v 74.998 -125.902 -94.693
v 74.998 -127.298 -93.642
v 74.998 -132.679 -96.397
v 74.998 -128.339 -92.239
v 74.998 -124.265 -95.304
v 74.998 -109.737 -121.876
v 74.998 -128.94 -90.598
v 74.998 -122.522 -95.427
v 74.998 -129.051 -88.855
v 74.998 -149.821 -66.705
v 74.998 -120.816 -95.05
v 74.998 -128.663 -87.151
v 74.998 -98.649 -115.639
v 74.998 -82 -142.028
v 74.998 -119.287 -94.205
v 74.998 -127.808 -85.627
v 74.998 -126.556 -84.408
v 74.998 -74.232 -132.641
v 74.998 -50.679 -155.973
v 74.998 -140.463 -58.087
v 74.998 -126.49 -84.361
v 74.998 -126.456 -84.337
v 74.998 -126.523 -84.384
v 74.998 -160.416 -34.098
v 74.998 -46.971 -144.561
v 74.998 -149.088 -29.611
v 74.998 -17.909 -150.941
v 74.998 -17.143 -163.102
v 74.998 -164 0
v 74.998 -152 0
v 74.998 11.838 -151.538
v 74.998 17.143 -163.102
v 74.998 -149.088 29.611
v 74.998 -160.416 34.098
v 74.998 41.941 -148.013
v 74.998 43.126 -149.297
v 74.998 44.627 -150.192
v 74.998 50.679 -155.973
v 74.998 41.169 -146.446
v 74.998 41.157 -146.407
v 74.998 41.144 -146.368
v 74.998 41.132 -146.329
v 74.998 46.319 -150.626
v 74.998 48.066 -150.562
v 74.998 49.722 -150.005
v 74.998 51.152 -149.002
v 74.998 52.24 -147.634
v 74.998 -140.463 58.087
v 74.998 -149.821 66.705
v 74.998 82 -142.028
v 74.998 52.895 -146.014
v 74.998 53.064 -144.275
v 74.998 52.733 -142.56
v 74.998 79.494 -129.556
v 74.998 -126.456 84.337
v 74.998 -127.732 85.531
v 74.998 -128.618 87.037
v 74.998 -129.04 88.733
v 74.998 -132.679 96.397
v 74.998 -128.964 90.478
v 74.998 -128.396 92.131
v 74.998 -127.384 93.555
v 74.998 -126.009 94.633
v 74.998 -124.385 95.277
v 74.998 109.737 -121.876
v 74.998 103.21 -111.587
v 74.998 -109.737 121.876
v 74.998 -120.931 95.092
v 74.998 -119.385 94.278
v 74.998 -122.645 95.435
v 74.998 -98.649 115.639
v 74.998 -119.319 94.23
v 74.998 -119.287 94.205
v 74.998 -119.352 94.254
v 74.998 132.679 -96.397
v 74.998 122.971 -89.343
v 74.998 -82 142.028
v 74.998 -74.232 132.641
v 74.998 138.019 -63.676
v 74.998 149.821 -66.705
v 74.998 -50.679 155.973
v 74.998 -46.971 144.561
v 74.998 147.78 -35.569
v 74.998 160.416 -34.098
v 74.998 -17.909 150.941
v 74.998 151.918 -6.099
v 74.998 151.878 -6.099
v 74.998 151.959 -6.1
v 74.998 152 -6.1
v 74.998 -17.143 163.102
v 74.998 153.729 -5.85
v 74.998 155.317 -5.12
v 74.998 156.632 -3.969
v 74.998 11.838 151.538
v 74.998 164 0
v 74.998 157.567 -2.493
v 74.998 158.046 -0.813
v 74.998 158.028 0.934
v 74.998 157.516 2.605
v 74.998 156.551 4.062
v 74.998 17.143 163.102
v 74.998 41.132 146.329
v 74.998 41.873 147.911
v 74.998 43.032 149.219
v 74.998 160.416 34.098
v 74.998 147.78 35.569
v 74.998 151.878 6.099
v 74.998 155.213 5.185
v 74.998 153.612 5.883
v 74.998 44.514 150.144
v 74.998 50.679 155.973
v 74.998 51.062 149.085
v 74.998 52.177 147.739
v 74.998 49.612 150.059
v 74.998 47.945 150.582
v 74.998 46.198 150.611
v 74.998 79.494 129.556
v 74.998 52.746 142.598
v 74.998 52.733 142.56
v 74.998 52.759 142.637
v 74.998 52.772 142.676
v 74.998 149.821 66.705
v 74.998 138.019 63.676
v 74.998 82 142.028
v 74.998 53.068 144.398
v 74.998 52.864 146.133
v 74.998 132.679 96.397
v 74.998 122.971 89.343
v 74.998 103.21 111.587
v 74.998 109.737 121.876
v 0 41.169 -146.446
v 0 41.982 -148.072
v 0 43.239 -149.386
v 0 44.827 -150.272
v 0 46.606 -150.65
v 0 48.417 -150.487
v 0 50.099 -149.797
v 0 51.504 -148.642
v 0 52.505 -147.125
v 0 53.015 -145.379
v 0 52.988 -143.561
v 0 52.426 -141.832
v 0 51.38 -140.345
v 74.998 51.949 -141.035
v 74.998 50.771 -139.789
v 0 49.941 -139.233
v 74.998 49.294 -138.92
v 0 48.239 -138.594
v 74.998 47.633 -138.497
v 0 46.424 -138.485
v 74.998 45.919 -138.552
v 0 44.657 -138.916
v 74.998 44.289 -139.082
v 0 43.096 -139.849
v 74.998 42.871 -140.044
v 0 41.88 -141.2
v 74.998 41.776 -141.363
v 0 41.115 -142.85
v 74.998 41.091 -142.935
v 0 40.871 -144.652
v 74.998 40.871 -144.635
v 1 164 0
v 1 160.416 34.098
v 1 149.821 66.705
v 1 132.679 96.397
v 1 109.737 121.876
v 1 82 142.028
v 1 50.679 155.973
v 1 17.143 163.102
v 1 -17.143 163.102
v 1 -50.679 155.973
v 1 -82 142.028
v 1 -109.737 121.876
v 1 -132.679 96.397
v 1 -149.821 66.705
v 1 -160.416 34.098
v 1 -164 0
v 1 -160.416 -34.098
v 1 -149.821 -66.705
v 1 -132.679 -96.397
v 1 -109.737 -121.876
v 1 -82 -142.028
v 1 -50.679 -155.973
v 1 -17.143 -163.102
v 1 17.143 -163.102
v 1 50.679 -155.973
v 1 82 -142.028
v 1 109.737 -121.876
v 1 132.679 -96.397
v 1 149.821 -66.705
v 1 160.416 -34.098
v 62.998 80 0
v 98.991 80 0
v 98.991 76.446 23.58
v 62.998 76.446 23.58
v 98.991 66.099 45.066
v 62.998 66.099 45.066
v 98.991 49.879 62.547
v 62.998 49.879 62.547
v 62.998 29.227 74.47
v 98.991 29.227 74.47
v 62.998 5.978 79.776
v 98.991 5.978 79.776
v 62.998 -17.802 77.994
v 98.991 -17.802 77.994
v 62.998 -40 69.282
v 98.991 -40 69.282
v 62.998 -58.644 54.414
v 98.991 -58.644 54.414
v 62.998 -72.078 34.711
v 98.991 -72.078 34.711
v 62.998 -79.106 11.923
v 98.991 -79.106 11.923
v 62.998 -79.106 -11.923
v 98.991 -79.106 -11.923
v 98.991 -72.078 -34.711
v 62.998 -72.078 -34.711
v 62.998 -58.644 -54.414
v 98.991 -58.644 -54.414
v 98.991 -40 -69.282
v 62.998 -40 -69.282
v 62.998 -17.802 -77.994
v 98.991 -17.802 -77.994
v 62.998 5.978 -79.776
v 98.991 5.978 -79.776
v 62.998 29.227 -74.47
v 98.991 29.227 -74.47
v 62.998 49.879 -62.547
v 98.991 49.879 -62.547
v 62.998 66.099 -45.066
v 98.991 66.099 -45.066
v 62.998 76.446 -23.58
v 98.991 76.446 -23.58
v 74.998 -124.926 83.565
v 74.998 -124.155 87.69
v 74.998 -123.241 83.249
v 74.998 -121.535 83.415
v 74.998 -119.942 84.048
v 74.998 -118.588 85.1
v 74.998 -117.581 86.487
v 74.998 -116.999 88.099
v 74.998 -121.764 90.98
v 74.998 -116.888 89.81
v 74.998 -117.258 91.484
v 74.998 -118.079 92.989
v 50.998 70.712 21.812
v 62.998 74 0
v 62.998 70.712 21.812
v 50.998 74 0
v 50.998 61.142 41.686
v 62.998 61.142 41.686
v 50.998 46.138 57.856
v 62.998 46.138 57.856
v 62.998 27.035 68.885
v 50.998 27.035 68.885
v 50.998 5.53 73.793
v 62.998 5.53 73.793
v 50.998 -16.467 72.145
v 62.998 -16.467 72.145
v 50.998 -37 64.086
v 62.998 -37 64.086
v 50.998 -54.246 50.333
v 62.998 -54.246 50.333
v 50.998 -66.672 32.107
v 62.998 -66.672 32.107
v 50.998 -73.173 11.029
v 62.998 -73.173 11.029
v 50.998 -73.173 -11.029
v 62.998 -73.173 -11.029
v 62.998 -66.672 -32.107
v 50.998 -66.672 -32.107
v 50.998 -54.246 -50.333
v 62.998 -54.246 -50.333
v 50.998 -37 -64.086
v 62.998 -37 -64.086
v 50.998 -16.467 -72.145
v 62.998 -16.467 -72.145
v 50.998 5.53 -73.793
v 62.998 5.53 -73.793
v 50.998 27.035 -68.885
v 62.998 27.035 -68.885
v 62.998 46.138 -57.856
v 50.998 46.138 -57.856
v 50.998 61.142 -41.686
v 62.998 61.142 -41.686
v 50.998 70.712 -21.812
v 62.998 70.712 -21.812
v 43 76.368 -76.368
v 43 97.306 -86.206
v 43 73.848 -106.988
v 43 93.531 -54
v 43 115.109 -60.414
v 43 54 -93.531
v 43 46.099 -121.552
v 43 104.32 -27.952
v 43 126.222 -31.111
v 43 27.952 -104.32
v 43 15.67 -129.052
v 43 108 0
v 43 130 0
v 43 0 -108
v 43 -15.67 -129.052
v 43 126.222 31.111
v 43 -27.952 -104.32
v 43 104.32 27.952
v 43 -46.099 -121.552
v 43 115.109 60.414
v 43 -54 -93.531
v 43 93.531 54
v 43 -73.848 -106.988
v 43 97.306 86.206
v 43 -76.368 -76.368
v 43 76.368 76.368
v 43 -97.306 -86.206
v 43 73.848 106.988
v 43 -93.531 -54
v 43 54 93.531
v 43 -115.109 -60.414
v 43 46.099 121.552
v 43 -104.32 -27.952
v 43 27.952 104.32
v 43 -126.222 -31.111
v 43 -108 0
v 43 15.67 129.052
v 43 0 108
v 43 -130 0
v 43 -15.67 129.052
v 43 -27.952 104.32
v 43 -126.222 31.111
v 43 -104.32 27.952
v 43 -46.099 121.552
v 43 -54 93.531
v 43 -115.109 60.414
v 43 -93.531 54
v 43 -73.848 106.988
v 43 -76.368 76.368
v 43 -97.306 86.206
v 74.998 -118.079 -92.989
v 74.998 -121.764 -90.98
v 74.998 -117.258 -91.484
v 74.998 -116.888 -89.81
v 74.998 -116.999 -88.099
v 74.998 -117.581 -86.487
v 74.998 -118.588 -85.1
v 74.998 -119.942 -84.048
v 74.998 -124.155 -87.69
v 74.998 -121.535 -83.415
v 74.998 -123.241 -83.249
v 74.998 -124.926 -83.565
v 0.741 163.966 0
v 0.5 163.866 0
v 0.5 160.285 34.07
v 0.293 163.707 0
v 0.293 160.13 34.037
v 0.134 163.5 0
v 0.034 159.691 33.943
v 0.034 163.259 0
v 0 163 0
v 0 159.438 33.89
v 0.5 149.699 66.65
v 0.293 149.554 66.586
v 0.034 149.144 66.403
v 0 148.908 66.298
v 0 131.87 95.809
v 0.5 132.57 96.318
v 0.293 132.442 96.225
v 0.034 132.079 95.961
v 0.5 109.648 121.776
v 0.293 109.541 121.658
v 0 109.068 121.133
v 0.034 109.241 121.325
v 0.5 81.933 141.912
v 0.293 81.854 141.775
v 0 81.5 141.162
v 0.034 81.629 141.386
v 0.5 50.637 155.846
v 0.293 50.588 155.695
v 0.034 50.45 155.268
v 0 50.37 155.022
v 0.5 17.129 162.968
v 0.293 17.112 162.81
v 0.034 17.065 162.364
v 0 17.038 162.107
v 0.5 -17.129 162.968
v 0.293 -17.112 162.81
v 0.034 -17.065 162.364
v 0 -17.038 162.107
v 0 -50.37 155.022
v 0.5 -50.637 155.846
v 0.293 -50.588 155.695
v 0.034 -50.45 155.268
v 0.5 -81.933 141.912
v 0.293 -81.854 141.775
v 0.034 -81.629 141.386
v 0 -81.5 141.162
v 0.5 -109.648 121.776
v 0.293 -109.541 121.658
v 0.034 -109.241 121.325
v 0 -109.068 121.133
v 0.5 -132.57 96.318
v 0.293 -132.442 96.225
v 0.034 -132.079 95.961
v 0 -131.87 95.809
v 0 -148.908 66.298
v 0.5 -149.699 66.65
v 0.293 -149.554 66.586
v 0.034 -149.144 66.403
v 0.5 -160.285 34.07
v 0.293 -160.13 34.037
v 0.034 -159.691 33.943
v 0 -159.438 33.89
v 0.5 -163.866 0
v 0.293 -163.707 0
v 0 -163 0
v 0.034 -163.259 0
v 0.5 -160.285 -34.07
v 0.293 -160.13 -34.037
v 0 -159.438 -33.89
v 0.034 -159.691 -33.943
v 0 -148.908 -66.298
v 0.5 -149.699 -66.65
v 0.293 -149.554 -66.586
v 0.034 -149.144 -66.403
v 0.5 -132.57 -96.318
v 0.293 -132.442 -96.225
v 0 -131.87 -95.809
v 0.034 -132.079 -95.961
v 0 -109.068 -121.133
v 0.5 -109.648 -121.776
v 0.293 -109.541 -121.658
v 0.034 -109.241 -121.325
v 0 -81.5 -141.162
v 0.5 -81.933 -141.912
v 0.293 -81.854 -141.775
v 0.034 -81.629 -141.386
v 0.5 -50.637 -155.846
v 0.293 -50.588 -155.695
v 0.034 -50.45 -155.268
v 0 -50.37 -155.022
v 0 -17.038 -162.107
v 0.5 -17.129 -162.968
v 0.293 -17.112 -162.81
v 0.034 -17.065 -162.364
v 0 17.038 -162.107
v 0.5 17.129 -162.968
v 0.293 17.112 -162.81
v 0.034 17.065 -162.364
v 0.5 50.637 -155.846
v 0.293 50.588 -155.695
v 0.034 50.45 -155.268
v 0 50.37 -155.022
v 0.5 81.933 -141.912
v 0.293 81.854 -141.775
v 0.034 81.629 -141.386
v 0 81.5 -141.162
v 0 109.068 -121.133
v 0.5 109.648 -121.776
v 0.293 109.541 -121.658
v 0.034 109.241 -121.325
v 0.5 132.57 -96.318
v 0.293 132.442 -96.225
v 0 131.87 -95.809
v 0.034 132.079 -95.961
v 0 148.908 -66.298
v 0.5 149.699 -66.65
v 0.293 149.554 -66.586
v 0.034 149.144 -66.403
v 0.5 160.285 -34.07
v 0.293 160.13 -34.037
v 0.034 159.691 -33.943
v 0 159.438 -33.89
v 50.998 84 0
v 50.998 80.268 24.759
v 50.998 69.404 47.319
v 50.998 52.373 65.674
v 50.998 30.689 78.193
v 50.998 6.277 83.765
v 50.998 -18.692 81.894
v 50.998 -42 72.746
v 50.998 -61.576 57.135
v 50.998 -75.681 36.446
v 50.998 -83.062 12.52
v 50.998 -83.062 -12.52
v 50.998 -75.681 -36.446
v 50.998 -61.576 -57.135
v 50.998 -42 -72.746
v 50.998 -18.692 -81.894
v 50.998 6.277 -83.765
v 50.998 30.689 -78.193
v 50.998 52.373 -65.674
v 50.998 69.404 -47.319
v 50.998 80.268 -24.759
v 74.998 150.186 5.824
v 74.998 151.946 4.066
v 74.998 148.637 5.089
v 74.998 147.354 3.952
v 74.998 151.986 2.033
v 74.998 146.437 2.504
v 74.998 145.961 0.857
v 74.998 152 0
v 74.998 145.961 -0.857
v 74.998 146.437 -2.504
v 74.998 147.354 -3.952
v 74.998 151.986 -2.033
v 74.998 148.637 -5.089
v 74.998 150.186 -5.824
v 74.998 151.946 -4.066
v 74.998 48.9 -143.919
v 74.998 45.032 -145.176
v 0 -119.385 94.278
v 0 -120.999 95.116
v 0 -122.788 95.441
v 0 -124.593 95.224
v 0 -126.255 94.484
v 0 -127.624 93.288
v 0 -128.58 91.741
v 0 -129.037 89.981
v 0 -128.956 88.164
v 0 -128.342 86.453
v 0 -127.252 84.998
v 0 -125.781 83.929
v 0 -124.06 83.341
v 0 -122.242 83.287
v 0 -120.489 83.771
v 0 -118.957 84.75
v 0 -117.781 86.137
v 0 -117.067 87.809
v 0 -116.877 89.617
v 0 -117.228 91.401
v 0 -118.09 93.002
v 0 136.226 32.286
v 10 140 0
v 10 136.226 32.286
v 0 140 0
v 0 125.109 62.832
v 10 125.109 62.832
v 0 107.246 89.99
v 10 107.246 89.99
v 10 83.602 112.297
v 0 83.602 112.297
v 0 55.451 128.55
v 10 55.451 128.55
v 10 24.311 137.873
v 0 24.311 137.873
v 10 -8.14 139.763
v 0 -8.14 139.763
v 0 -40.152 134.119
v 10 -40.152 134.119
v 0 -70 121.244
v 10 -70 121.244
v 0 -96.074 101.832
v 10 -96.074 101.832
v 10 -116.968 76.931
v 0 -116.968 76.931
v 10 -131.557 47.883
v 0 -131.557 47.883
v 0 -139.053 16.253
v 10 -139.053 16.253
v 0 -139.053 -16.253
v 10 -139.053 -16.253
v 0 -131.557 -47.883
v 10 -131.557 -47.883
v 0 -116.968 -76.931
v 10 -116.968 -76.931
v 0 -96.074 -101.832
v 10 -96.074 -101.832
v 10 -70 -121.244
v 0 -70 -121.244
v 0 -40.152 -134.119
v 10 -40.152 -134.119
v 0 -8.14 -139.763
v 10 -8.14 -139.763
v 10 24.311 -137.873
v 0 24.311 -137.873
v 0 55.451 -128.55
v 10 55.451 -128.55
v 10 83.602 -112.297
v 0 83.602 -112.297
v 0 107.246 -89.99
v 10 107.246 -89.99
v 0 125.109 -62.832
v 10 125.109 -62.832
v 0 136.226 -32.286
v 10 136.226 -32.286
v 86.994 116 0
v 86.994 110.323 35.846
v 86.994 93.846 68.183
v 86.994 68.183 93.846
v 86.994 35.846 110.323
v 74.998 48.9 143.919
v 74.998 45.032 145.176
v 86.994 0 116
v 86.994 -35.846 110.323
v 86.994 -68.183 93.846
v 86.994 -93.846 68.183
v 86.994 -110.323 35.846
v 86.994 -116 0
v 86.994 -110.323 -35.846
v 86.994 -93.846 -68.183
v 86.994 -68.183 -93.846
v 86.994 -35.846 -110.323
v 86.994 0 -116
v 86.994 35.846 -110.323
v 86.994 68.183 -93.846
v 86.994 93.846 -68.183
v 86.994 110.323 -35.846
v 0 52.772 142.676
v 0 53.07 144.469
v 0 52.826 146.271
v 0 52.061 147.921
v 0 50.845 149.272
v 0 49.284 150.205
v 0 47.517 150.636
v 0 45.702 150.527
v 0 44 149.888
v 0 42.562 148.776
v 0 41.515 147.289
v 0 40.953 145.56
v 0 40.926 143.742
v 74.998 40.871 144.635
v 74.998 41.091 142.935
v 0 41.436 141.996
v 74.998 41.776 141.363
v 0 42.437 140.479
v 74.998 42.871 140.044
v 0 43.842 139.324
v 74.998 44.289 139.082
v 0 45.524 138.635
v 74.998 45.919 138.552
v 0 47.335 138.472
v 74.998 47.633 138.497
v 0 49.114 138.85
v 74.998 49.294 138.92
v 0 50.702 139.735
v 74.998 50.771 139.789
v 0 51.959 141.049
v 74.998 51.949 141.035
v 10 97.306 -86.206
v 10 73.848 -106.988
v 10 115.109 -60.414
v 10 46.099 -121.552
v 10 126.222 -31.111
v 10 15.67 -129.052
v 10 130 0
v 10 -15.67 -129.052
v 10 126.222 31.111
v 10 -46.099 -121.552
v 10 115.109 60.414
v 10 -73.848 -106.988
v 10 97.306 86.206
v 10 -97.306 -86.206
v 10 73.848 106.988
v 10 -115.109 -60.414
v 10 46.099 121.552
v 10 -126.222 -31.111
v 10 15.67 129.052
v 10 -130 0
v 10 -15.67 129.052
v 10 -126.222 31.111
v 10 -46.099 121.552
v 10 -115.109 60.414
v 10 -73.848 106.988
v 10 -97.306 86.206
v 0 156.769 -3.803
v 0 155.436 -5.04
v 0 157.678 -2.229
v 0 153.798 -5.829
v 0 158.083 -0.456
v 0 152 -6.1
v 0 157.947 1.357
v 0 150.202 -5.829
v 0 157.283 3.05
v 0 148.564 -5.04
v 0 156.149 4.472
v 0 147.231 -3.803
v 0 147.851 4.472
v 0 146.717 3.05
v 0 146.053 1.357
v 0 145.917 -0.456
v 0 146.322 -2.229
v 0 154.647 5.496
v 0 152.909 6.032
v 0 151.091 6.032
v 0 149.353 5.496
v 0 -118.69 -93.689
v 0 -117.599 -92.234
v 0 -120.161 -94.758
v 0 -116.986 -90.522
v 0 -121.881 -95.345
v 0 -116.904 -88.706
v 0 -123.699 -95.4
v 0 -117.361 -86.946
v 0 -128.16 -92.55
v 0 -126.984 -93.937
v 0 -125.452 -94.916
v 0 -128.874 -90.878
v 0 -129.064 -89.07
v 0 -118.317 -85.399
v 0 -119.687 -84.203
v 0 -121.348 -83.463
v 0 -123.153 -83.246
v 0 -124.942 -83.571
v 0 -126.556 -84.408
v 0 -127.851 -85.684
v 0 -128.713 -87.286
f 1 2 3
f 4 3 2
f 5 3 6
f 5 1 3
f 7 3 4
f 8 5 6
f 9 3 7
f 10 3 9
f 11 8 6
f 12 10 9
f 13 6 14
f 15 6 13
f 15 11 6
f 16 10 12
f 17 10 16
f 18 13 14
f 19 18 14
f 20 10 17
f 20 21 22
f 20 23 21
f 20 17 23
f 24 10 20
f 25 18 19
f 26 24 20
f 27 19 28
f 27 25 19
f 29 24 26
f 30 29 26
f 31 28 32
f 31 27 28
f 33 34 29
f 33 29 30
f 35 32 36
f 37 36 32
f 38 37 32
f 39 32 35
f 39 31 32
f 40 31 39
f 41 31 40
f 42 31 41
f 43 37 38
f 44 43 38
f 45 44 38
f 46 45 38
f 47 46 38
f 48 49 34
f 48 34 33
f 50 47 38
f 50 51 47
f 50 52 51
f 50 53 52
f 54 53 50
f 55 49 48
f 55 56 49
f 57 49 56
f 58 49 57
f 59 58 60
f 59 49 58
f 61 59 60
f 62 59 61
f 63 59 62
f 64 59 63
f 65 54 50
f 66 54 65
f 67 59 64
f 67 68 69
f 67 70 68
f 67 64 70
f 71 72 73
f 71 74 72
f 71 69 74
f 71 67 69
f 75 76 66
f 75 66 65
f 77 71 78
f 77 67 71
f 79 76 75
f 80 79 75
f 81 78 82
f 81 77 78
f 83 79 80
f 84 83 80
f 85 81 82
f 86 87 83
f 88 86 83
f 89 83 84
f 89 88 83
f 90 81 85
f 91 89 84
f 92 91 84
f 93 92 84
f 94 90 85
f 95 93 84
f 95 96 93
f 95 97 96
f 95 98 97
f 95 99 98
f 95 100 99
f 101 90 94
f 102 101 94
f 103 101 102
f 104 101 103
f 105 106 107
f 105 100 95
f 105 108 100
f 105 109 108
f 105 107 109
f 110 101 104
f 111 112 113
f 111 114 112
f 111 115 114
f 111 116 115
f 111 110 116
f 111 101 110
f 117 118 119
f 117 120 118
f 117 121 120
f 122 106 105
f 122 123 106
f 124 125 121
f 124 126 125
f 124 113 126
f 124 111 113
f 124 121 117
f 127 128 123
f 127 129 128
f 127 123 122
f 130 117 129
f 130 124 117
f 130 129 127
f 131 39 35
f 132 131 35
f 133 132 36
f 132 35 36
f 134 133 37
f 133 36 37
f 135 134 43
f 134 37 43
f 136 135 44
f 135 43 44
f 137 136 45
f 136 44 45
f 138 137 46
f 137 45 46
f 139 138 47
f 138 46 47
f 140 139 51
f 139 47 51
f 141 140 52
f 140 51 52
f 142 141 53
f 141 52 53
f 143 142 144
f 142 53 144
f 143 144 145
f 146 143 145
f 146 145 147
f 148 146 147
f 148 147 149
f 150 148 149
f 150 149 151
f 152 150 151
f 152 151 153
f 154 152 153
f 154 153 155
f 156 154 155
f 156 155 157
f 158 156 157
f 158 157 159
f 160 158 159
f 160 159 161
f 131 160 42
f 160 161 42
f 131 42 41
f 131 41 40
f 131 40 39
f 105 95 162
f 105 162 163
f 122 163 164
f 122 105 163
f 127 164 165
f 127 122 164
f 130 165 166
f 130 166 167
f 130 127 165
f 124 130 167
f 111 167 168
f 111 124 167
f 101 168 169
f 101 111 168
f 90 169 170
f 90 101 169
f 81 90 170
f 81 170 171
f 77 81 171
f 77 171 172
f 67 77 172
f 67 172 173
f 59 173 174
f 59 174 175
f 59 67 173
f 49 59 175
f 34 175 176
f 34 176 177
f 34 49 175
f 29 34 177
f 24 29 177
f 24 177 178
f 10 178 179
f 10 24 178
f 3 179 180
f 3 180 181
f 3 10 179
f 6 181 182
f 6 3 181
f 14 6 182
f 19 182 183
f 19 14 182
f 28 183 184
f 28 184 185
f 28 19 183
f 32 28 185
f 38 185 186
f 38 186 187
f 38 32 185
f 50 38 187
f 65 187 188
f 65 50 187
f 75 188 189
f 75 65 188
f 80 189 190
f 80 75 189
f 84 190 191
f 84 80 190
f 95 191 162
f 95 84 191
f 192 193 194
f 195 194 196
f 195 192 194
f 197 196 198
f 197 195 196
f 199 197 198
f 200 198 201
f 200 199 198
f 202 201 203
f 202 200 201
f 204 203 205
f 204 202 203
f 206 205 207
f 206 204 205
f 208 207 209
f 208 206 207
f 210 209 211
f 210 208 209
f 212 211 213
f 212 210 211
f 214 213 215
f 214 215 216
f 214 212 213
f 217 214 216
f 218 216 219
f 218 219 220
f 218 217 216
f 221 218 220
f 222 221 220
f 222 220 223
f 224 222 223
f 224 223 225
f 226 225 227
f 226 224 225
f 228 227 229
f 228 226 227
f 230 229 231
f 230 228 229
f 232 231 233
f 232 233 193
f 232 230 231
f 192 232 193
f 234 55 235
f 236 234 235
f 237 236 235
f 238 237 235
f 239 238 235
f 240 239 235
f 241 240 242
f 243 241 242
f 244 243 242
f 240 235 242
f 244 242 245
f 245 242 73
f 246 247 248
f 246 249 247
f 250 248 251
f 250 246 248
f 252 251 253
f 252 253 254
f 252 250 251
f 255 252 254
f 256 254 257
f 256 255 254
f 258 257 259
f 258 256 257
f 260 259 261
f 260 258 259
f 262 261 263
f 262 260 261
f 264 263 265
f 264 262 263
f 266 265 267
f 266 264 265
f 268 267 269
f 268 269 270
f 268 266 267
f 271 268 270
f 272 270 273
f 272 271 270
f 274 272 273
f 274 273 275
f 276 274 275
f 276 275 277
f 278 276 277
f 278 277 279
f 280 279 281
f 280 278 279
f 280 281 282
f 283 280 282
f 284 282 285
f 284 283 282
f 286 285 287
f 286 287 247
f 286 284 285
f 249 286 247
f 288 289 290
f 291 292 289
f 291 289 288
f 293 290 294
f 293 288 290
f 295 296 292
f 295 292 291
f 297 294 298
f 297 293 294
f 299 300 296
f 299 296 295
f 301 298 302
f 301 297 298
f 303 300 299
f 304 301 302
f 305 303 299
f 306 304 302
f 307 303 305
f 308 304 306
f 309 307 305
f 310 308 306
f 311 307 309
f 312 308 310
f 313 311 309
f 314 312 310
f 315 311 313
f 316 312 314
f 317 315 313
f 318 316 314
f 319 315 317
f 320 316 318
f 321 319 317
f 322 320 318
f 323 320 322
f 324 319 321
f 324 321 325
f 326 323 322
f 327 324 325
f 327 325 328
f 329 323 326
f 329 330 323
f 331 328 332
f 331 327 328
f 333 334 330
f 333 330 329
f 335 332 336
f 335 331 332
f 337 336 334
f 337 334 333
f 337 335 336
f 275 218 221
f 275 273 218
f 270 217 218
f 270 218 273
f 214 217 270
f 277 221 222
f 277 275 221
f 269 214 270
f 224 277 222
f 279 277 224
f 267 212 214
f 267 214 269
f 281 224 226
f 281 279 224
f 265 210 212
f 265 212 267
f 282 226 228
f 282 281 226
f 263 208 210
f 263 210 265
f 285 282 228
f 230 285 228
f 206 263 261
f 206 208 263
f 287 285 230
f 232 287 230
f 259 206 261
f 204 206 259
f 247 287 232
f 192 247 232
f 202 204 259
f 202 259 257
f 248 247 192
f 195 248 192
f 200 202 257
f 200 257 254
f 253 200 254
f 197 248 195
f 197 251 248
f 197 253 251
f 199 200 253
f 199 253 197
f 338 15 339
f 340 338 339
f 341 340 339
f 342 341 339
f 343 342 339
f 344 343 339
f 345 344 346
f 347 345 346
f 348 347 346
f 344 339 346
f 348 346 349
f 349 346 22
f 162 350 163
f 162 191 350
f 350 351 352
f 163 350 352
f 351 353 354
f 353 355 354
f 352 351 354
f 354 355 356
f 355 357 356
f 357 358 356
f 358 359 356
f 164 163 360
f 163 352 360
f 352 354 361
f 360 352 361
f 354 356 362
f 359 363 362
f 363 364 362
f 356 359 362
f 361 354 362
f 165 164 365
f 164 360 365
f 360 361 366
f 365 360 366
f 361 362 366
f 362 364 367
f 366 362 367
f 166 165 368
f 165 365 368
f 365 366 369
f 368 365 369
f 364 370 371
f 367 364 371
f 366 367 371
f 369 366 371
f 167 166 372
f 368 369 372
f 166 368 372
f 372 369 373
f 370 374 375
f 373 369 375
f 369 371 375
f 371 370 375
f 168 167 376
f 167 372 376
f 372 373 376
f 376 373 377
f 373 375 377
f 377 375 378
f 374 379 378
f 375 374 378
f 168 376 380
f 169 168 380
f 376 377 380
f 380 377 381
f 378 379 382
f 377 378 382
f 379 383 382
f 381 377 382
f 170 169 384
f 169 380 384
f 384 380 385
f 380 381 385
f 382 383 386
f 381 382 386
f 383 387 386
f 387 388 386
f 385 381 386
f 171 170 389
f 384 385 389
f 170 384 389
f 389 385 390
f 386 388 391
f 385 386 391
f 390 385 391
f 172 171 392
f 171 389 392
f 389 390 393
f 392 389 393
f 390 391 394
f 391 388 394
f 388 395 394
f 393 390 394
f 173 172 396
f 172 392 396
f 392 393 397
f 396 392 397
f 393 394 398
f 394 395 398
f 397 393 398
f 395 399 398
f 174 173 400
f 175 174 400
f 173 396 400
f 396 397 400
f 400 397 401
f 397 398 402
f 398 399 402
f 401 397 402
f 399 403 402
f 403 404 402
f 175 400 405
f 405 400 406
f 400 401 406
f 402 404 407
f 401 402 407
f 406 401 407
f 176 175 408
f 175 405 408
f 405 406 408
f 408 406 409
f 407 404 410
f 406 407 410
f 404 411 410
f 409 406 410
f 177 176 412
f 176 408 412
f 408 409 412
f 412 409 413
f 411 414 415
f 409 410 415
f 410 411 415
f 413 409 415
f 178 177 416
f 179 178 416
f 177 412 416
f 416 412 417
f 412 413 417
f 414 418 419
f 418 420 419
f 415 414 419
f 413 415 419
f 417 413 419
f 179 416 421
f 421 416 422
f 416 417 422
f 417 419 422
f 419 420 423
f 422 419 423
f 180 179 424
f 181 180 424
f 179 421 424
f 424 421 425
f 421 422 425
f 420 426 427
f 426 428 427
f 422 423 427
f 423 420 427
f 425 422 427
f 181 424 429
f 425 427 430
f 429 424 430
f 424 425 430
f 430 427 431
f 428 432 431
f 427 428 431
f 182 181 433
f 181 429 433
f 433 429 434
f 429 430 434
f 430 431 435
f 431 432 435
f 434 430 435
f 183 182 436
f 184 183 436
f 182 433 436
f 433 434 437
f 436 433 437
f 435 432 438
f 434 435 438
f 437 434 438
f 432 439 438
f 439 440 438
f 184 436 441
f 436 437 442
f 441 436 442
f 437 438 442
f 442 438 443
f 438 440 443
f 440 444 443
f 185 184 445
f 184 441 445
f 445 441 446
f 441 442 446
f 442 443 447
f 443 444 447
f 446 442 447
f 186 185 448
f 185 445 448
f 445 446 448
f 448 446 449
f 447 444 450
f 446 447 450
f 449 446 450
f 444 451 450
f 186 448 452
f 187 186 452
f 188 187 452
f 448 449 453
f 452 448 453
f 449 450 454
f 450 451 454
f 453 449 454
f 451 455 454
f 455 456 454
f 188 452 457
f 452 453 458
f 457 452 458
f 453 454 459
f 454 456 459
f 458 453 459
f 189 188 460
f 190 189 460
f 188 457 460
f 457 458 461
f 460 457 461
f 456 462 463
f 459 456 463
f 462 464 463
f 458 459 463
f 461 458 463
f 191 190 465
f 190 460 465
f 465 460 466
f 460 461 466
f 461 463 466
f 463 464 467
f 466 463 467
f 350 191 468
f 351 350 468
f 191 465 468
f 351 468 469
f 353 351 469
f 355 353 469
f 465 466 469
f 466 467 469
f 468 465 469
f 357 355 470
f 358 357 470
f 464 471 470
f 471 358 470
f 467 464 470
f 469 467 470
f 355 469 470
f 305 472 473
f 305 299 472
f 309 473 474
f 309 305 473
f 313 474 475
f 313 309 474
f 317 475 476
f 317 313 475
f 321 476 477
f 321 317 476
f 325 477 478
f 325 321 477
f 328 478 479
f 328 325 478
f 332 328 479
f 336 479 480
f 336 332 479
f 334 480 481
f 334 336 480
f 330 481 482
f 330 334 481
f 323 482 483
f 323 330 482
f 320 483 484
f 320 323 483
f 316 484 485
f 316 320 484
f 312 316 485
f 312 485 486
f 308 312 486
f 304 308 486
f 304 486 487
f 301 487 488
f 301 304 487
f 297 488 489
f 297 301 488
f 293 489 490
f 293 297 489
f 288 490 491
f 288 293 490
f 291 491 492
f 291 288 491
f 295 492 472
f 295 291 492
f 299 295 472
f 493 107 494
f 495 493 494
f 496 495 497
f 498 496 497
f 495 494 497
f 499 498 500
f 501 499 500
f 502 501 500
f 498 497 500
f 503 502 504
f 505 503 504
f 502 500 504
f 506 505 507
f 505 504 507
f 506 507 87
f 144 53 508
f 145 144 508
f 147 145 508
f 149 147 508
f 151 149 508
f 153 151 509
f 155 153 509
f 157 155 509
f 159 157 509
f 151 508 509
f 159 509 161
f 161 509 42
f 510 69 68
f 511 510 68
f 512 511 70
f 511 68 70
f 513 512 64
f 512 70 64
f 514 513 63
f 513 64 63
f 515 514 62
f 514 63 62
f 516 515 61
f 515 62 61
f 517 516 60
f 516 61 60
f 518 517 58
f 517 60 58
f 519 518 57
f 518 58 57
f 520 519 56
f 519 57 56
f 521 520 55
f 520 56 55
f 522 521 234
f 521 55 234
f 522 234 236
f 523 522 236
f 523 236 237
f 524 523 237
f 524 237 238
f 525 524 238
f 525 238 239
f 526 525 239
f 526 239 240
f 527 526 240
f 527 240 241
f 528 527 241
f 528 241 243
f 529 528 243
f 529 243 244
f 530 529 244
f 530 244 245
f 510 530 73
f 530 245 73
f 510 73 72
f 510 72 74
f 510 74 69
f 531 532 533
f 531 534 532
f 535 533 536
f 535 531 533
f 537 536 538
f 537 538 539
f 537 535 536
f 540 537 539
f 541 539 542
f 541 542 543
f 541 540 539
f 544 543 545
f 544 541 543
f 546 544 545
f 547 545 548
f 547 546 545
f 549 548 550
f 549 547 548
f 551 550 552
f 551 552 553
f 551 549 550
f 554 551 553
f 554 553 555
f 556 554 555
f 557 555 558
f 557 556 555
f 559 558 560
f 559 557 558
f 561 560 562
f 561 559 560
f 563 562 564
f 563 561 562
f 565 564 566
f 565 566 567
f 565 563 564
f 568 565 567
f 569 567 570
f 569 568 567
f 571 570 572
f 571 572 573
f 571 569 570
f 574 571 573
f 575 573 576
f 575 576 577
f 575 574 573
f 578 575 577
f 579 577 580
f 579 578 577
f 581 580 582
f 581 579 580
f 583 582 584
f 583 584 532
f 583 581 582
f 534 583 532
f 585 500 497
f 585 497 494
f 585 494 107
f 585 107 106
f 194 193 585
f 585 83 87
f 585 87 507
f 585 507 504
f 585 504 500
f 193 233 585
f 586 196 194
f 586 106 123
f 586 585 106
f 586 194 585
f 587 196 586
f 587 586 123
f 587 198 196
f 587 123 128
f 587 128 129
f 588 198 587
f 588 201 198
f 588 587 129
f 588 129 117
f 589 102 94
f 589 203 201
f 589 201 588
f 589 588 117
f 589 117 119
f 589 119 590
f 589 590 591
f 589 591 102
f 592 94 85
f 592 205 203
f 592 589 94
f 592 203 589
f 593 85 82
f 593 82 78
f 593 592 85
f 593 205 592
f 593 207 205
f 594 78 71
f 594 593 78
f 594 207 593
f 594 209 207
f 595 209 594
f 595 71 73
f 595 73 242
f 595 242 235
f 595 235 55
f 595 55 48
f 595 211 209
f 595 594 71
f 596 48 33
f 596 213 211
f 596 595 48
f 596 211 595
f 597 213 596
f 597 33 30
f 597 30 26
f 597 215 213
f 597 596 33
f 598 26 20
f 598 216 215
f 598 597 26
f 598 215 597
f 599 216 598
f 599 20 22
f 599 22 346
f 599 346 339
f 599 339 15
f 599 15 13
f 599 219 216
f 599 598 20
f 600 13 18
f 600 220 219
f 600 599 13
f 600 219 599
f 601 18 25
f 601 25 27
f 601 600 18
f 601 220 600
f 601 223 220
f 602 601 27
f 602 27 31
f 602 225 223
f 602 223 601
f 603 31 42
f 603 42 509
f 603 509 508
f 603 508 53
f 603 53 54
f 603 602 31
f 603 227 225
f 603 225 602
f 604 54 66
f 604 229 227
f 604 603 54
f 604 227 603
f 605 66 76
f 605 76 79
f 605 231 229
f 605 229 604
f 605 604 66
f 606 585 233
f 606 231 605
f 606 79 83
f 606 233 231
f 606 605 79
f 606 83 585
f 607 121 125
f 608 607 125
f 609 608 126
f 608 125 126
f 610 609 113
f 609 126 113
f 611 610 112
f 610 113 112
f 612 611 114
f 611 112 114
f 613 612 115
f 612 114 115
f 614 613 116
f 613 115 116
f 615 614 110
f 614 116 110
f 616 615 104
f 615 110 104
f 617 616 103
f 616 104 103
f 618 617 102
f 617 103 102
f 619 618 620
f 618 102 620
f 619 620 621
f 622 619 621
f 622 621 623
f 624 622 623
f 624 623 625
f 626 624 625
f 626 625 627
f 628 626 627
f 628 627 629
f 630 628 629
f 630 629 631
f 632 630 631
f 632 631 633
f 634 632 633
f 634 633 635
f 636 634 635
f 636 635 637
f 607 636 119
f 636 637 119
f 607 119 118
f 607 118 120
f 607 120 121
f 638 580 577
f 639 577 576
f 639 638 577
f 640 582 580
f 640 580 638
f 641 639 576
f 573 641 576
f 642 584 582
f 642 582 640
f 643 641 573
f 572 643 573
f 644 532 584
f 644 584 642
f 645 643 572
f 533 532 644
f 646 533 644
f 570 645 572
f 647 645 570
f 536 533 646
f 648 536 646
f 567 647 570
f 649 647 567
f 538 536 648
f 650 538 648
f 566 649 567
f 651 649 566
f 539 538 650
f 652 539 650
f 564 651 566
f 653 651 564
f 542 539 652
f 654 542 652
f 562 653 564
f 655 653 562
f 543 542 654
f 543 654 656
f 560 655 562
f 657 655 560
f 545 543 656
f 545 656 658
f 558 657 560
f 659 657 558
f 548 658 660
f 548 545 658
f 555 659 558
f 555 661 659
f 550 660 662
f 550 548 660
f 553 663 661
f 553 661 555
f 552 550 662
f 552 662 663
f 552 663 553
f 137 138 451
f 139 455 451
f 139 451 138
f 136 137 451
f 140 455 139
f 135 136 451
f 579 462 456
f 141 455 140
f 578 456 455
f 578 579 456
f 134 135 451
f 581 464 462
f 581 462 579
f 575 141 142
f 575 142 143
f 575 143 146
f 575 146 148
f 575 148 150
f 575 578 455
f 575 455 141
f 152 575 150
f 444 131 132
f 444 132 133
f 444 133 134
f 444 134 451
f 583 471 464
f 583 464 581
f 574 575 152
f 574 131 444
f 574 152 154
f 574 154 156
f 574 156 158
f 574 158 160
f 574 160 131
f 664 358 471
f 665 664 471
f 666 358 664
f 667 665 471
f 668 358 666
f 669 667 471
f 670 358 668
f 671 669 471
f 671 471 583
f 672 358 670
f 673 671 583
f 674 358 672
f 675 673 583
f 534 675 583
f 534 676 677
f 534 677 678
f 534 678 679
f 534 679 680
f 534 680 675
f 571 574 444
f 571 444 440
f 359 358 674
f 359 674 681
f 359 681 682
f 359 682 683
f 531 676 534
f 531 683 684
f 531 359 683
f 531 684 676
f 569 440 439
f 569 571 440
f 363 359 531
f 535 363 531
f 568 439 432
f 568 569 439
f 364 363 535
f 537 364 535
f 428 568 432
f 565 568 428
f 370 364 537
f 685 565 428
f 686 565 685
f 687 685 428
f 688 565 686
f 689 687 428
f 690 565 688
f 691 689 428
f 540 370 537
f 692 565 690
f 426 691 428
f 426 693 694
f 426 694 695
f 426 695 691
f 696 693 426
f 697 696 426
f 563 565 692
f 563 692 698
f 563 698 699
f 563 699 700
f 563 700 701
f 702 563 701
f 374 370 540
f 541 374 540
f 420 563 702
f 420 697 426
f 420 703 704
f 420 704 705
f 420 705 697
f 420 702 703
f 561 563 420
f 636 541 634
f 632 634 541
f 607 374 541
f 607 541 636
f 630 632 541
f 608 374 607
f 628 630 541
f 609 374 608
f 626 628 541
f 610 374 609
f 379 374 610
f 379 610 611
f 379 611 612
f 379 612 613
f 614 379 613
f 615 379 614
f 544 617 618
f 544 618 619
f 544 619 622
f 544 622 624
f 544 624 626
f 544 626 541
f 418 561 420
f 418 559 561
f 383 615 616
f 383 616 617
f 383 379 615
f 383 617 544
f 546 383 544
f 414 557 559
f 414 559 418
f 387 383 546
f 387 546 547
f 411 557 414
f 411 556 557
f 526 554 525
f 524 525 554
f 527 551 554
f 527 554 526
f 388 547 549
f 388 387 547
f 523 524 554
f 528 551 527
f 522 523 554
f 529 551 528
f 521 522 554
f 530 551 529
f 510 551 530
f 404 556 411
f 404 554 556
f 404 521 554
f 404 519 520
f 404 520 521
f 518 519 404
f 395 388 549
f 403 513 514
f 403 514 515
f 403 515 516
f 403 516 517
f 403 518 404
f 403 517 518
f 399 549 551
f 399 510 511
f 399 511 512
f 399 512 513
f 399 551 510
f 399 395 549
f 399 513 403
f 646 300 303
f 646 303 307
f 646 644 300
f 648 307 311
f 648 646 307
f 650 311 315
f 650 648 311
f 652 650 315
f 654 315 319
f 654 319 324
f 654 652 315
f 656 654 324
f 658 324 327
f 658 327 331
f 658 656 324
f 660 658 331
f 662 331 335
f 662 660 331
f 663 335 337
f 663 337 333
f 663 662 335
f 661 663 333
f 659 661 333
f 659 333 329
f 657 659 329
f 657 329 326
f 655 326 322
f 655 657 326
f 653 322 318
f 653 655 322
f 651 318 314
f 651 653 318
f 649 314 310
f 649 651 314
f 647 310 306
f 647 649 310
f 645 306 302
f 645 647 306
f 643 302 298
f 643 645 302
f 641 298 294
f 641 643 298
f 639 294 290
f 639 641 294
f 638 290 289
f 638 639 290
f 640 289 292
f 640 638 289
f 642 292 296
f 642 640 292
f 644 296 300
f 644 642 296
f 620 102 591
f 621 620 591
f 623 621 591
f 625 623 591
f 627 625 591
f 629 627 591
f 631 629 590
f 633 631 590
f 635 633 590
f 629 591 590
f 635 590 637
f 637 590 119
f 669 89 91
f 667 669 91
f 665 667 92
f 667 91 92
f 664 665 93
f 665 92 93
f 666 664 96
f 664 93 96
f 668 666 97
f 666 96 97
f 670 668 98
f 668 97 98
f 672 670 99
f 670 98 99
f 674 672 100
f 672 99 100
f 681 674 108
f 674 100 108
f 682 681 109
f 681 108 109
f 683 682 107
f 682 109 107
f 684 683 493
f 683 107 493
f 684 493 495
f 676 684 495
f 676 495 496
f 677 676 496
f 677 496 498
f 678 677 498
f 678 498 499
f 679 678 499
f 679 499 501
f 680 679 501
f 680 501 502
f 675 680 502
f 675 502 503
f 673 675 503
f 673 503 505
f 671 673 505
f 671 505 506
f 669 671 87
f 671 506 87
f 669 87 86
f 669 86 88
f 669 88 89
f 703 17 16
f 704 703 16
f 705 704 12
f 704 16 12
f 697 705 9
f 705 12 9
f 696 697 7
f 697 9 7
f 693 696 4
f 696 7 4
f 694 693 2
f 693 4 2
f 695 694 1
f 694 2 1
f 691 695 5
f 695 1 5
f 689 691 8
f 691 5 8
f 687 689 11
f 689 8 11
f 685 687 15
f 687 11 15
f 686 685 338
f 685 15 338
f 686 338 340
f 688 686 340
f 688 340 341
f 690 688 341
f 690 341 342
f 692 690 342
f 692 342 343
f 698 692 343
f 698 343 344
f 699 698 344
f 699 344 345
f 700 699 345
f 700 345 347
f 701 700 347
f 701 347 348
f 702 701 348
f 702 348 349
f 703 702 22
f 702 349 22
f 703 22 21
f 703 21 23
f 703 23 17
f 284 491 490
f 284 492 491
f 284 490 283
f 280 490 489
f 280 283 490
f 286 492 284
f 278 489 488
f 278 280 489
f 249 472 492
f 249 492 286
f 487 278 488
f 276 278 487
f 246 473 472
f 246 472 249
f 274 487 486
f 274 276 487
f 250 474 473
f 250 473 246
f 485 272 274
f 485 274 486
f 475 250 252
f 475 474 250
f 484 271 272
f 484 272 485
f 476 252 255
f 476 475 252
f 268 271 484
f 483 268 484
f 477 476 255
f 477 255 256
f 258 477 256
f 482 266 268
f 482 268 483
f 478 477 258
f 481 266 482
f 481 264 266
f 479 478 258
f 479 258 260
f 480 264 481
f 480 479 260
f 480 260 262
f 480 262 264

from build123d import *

# Parameters (mm, degrees)
SKETCH2_R          = 6.1
CUT_EXTRUDE1_DEPTH = 74.99773
CIRPATTERN1_COUNT  = 5
FILLET8_R          = 1


with BuildPart() as part:
    # Sketch1 → Revolve1 (revolve)
    with BuildSketch(Plane.XY):
        Polygon((74.997729735, 164), (74.997729735, 152), (98.99091894, 80), (62.997729735, 80), (62.997729735, 74), (50.997729735, 74), (50.997729735, 84), (43, 108), (43, 130), (10, 130), (10, 140), (0, 140), (0, 164), align=None)
    revolve(axis=Axis((0, 0, 0), (1, 0, 0)))

    # Sketch2 → Cut-Extrude1 (cut)
    with BuildSketch(Plane(origin=(74.997729735, 0, 0), x_dir=(0, 0, -1), z_dir=(1, 0, 0))):
        with Locations((0, 152)):
            Circle(SKETCH2_R)
    cut_extrude1 = extrude(amount=-CUT_EXTRUDE1_DEPTH, mode=Mode.SUBTRACT)

    # CirPattern1: Cut-Extrude1 ×5 about axis
    cirpattern1_axis = Axis((0, 0, 0), (1, 0, 0))
    for i in range(1, CIRPATTERN1_COUNT):
        add(cut_extrude1.rotate(cirpattern1_axis, i * 360 / CIRPATTERN1_COUNT), mode=Mode.SUBTRACT)

    # Fillet8
    fillet8_edges = [part.edges().sort_by_distance(p)[0] for p in [
        (0, -164, 0),
    ]]
    fillet(fillet8_edges, radius=FILLET8_R)


solid = part.part
